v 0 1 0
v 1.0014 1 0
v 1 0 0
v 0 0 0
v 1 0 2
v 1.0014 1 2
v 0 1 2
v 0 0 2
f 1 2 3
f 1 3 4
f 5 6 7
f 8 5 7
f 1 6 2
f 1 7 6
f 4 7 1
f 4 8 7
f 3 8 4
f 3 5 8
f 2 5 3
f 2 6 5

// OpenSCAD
// This crashes OpenSCAD including 2011.06 in PolyReducer due to two vertices of
// a triangle evaluating to the same index
linear_extrude(height=2)
  polygon(points=[[0, 0],
		  [1, 0],
		  [1.0014, 1],
		  [1, 1],
		  [0, 1]],
           paths=[[0,1,2,3,4]]);
